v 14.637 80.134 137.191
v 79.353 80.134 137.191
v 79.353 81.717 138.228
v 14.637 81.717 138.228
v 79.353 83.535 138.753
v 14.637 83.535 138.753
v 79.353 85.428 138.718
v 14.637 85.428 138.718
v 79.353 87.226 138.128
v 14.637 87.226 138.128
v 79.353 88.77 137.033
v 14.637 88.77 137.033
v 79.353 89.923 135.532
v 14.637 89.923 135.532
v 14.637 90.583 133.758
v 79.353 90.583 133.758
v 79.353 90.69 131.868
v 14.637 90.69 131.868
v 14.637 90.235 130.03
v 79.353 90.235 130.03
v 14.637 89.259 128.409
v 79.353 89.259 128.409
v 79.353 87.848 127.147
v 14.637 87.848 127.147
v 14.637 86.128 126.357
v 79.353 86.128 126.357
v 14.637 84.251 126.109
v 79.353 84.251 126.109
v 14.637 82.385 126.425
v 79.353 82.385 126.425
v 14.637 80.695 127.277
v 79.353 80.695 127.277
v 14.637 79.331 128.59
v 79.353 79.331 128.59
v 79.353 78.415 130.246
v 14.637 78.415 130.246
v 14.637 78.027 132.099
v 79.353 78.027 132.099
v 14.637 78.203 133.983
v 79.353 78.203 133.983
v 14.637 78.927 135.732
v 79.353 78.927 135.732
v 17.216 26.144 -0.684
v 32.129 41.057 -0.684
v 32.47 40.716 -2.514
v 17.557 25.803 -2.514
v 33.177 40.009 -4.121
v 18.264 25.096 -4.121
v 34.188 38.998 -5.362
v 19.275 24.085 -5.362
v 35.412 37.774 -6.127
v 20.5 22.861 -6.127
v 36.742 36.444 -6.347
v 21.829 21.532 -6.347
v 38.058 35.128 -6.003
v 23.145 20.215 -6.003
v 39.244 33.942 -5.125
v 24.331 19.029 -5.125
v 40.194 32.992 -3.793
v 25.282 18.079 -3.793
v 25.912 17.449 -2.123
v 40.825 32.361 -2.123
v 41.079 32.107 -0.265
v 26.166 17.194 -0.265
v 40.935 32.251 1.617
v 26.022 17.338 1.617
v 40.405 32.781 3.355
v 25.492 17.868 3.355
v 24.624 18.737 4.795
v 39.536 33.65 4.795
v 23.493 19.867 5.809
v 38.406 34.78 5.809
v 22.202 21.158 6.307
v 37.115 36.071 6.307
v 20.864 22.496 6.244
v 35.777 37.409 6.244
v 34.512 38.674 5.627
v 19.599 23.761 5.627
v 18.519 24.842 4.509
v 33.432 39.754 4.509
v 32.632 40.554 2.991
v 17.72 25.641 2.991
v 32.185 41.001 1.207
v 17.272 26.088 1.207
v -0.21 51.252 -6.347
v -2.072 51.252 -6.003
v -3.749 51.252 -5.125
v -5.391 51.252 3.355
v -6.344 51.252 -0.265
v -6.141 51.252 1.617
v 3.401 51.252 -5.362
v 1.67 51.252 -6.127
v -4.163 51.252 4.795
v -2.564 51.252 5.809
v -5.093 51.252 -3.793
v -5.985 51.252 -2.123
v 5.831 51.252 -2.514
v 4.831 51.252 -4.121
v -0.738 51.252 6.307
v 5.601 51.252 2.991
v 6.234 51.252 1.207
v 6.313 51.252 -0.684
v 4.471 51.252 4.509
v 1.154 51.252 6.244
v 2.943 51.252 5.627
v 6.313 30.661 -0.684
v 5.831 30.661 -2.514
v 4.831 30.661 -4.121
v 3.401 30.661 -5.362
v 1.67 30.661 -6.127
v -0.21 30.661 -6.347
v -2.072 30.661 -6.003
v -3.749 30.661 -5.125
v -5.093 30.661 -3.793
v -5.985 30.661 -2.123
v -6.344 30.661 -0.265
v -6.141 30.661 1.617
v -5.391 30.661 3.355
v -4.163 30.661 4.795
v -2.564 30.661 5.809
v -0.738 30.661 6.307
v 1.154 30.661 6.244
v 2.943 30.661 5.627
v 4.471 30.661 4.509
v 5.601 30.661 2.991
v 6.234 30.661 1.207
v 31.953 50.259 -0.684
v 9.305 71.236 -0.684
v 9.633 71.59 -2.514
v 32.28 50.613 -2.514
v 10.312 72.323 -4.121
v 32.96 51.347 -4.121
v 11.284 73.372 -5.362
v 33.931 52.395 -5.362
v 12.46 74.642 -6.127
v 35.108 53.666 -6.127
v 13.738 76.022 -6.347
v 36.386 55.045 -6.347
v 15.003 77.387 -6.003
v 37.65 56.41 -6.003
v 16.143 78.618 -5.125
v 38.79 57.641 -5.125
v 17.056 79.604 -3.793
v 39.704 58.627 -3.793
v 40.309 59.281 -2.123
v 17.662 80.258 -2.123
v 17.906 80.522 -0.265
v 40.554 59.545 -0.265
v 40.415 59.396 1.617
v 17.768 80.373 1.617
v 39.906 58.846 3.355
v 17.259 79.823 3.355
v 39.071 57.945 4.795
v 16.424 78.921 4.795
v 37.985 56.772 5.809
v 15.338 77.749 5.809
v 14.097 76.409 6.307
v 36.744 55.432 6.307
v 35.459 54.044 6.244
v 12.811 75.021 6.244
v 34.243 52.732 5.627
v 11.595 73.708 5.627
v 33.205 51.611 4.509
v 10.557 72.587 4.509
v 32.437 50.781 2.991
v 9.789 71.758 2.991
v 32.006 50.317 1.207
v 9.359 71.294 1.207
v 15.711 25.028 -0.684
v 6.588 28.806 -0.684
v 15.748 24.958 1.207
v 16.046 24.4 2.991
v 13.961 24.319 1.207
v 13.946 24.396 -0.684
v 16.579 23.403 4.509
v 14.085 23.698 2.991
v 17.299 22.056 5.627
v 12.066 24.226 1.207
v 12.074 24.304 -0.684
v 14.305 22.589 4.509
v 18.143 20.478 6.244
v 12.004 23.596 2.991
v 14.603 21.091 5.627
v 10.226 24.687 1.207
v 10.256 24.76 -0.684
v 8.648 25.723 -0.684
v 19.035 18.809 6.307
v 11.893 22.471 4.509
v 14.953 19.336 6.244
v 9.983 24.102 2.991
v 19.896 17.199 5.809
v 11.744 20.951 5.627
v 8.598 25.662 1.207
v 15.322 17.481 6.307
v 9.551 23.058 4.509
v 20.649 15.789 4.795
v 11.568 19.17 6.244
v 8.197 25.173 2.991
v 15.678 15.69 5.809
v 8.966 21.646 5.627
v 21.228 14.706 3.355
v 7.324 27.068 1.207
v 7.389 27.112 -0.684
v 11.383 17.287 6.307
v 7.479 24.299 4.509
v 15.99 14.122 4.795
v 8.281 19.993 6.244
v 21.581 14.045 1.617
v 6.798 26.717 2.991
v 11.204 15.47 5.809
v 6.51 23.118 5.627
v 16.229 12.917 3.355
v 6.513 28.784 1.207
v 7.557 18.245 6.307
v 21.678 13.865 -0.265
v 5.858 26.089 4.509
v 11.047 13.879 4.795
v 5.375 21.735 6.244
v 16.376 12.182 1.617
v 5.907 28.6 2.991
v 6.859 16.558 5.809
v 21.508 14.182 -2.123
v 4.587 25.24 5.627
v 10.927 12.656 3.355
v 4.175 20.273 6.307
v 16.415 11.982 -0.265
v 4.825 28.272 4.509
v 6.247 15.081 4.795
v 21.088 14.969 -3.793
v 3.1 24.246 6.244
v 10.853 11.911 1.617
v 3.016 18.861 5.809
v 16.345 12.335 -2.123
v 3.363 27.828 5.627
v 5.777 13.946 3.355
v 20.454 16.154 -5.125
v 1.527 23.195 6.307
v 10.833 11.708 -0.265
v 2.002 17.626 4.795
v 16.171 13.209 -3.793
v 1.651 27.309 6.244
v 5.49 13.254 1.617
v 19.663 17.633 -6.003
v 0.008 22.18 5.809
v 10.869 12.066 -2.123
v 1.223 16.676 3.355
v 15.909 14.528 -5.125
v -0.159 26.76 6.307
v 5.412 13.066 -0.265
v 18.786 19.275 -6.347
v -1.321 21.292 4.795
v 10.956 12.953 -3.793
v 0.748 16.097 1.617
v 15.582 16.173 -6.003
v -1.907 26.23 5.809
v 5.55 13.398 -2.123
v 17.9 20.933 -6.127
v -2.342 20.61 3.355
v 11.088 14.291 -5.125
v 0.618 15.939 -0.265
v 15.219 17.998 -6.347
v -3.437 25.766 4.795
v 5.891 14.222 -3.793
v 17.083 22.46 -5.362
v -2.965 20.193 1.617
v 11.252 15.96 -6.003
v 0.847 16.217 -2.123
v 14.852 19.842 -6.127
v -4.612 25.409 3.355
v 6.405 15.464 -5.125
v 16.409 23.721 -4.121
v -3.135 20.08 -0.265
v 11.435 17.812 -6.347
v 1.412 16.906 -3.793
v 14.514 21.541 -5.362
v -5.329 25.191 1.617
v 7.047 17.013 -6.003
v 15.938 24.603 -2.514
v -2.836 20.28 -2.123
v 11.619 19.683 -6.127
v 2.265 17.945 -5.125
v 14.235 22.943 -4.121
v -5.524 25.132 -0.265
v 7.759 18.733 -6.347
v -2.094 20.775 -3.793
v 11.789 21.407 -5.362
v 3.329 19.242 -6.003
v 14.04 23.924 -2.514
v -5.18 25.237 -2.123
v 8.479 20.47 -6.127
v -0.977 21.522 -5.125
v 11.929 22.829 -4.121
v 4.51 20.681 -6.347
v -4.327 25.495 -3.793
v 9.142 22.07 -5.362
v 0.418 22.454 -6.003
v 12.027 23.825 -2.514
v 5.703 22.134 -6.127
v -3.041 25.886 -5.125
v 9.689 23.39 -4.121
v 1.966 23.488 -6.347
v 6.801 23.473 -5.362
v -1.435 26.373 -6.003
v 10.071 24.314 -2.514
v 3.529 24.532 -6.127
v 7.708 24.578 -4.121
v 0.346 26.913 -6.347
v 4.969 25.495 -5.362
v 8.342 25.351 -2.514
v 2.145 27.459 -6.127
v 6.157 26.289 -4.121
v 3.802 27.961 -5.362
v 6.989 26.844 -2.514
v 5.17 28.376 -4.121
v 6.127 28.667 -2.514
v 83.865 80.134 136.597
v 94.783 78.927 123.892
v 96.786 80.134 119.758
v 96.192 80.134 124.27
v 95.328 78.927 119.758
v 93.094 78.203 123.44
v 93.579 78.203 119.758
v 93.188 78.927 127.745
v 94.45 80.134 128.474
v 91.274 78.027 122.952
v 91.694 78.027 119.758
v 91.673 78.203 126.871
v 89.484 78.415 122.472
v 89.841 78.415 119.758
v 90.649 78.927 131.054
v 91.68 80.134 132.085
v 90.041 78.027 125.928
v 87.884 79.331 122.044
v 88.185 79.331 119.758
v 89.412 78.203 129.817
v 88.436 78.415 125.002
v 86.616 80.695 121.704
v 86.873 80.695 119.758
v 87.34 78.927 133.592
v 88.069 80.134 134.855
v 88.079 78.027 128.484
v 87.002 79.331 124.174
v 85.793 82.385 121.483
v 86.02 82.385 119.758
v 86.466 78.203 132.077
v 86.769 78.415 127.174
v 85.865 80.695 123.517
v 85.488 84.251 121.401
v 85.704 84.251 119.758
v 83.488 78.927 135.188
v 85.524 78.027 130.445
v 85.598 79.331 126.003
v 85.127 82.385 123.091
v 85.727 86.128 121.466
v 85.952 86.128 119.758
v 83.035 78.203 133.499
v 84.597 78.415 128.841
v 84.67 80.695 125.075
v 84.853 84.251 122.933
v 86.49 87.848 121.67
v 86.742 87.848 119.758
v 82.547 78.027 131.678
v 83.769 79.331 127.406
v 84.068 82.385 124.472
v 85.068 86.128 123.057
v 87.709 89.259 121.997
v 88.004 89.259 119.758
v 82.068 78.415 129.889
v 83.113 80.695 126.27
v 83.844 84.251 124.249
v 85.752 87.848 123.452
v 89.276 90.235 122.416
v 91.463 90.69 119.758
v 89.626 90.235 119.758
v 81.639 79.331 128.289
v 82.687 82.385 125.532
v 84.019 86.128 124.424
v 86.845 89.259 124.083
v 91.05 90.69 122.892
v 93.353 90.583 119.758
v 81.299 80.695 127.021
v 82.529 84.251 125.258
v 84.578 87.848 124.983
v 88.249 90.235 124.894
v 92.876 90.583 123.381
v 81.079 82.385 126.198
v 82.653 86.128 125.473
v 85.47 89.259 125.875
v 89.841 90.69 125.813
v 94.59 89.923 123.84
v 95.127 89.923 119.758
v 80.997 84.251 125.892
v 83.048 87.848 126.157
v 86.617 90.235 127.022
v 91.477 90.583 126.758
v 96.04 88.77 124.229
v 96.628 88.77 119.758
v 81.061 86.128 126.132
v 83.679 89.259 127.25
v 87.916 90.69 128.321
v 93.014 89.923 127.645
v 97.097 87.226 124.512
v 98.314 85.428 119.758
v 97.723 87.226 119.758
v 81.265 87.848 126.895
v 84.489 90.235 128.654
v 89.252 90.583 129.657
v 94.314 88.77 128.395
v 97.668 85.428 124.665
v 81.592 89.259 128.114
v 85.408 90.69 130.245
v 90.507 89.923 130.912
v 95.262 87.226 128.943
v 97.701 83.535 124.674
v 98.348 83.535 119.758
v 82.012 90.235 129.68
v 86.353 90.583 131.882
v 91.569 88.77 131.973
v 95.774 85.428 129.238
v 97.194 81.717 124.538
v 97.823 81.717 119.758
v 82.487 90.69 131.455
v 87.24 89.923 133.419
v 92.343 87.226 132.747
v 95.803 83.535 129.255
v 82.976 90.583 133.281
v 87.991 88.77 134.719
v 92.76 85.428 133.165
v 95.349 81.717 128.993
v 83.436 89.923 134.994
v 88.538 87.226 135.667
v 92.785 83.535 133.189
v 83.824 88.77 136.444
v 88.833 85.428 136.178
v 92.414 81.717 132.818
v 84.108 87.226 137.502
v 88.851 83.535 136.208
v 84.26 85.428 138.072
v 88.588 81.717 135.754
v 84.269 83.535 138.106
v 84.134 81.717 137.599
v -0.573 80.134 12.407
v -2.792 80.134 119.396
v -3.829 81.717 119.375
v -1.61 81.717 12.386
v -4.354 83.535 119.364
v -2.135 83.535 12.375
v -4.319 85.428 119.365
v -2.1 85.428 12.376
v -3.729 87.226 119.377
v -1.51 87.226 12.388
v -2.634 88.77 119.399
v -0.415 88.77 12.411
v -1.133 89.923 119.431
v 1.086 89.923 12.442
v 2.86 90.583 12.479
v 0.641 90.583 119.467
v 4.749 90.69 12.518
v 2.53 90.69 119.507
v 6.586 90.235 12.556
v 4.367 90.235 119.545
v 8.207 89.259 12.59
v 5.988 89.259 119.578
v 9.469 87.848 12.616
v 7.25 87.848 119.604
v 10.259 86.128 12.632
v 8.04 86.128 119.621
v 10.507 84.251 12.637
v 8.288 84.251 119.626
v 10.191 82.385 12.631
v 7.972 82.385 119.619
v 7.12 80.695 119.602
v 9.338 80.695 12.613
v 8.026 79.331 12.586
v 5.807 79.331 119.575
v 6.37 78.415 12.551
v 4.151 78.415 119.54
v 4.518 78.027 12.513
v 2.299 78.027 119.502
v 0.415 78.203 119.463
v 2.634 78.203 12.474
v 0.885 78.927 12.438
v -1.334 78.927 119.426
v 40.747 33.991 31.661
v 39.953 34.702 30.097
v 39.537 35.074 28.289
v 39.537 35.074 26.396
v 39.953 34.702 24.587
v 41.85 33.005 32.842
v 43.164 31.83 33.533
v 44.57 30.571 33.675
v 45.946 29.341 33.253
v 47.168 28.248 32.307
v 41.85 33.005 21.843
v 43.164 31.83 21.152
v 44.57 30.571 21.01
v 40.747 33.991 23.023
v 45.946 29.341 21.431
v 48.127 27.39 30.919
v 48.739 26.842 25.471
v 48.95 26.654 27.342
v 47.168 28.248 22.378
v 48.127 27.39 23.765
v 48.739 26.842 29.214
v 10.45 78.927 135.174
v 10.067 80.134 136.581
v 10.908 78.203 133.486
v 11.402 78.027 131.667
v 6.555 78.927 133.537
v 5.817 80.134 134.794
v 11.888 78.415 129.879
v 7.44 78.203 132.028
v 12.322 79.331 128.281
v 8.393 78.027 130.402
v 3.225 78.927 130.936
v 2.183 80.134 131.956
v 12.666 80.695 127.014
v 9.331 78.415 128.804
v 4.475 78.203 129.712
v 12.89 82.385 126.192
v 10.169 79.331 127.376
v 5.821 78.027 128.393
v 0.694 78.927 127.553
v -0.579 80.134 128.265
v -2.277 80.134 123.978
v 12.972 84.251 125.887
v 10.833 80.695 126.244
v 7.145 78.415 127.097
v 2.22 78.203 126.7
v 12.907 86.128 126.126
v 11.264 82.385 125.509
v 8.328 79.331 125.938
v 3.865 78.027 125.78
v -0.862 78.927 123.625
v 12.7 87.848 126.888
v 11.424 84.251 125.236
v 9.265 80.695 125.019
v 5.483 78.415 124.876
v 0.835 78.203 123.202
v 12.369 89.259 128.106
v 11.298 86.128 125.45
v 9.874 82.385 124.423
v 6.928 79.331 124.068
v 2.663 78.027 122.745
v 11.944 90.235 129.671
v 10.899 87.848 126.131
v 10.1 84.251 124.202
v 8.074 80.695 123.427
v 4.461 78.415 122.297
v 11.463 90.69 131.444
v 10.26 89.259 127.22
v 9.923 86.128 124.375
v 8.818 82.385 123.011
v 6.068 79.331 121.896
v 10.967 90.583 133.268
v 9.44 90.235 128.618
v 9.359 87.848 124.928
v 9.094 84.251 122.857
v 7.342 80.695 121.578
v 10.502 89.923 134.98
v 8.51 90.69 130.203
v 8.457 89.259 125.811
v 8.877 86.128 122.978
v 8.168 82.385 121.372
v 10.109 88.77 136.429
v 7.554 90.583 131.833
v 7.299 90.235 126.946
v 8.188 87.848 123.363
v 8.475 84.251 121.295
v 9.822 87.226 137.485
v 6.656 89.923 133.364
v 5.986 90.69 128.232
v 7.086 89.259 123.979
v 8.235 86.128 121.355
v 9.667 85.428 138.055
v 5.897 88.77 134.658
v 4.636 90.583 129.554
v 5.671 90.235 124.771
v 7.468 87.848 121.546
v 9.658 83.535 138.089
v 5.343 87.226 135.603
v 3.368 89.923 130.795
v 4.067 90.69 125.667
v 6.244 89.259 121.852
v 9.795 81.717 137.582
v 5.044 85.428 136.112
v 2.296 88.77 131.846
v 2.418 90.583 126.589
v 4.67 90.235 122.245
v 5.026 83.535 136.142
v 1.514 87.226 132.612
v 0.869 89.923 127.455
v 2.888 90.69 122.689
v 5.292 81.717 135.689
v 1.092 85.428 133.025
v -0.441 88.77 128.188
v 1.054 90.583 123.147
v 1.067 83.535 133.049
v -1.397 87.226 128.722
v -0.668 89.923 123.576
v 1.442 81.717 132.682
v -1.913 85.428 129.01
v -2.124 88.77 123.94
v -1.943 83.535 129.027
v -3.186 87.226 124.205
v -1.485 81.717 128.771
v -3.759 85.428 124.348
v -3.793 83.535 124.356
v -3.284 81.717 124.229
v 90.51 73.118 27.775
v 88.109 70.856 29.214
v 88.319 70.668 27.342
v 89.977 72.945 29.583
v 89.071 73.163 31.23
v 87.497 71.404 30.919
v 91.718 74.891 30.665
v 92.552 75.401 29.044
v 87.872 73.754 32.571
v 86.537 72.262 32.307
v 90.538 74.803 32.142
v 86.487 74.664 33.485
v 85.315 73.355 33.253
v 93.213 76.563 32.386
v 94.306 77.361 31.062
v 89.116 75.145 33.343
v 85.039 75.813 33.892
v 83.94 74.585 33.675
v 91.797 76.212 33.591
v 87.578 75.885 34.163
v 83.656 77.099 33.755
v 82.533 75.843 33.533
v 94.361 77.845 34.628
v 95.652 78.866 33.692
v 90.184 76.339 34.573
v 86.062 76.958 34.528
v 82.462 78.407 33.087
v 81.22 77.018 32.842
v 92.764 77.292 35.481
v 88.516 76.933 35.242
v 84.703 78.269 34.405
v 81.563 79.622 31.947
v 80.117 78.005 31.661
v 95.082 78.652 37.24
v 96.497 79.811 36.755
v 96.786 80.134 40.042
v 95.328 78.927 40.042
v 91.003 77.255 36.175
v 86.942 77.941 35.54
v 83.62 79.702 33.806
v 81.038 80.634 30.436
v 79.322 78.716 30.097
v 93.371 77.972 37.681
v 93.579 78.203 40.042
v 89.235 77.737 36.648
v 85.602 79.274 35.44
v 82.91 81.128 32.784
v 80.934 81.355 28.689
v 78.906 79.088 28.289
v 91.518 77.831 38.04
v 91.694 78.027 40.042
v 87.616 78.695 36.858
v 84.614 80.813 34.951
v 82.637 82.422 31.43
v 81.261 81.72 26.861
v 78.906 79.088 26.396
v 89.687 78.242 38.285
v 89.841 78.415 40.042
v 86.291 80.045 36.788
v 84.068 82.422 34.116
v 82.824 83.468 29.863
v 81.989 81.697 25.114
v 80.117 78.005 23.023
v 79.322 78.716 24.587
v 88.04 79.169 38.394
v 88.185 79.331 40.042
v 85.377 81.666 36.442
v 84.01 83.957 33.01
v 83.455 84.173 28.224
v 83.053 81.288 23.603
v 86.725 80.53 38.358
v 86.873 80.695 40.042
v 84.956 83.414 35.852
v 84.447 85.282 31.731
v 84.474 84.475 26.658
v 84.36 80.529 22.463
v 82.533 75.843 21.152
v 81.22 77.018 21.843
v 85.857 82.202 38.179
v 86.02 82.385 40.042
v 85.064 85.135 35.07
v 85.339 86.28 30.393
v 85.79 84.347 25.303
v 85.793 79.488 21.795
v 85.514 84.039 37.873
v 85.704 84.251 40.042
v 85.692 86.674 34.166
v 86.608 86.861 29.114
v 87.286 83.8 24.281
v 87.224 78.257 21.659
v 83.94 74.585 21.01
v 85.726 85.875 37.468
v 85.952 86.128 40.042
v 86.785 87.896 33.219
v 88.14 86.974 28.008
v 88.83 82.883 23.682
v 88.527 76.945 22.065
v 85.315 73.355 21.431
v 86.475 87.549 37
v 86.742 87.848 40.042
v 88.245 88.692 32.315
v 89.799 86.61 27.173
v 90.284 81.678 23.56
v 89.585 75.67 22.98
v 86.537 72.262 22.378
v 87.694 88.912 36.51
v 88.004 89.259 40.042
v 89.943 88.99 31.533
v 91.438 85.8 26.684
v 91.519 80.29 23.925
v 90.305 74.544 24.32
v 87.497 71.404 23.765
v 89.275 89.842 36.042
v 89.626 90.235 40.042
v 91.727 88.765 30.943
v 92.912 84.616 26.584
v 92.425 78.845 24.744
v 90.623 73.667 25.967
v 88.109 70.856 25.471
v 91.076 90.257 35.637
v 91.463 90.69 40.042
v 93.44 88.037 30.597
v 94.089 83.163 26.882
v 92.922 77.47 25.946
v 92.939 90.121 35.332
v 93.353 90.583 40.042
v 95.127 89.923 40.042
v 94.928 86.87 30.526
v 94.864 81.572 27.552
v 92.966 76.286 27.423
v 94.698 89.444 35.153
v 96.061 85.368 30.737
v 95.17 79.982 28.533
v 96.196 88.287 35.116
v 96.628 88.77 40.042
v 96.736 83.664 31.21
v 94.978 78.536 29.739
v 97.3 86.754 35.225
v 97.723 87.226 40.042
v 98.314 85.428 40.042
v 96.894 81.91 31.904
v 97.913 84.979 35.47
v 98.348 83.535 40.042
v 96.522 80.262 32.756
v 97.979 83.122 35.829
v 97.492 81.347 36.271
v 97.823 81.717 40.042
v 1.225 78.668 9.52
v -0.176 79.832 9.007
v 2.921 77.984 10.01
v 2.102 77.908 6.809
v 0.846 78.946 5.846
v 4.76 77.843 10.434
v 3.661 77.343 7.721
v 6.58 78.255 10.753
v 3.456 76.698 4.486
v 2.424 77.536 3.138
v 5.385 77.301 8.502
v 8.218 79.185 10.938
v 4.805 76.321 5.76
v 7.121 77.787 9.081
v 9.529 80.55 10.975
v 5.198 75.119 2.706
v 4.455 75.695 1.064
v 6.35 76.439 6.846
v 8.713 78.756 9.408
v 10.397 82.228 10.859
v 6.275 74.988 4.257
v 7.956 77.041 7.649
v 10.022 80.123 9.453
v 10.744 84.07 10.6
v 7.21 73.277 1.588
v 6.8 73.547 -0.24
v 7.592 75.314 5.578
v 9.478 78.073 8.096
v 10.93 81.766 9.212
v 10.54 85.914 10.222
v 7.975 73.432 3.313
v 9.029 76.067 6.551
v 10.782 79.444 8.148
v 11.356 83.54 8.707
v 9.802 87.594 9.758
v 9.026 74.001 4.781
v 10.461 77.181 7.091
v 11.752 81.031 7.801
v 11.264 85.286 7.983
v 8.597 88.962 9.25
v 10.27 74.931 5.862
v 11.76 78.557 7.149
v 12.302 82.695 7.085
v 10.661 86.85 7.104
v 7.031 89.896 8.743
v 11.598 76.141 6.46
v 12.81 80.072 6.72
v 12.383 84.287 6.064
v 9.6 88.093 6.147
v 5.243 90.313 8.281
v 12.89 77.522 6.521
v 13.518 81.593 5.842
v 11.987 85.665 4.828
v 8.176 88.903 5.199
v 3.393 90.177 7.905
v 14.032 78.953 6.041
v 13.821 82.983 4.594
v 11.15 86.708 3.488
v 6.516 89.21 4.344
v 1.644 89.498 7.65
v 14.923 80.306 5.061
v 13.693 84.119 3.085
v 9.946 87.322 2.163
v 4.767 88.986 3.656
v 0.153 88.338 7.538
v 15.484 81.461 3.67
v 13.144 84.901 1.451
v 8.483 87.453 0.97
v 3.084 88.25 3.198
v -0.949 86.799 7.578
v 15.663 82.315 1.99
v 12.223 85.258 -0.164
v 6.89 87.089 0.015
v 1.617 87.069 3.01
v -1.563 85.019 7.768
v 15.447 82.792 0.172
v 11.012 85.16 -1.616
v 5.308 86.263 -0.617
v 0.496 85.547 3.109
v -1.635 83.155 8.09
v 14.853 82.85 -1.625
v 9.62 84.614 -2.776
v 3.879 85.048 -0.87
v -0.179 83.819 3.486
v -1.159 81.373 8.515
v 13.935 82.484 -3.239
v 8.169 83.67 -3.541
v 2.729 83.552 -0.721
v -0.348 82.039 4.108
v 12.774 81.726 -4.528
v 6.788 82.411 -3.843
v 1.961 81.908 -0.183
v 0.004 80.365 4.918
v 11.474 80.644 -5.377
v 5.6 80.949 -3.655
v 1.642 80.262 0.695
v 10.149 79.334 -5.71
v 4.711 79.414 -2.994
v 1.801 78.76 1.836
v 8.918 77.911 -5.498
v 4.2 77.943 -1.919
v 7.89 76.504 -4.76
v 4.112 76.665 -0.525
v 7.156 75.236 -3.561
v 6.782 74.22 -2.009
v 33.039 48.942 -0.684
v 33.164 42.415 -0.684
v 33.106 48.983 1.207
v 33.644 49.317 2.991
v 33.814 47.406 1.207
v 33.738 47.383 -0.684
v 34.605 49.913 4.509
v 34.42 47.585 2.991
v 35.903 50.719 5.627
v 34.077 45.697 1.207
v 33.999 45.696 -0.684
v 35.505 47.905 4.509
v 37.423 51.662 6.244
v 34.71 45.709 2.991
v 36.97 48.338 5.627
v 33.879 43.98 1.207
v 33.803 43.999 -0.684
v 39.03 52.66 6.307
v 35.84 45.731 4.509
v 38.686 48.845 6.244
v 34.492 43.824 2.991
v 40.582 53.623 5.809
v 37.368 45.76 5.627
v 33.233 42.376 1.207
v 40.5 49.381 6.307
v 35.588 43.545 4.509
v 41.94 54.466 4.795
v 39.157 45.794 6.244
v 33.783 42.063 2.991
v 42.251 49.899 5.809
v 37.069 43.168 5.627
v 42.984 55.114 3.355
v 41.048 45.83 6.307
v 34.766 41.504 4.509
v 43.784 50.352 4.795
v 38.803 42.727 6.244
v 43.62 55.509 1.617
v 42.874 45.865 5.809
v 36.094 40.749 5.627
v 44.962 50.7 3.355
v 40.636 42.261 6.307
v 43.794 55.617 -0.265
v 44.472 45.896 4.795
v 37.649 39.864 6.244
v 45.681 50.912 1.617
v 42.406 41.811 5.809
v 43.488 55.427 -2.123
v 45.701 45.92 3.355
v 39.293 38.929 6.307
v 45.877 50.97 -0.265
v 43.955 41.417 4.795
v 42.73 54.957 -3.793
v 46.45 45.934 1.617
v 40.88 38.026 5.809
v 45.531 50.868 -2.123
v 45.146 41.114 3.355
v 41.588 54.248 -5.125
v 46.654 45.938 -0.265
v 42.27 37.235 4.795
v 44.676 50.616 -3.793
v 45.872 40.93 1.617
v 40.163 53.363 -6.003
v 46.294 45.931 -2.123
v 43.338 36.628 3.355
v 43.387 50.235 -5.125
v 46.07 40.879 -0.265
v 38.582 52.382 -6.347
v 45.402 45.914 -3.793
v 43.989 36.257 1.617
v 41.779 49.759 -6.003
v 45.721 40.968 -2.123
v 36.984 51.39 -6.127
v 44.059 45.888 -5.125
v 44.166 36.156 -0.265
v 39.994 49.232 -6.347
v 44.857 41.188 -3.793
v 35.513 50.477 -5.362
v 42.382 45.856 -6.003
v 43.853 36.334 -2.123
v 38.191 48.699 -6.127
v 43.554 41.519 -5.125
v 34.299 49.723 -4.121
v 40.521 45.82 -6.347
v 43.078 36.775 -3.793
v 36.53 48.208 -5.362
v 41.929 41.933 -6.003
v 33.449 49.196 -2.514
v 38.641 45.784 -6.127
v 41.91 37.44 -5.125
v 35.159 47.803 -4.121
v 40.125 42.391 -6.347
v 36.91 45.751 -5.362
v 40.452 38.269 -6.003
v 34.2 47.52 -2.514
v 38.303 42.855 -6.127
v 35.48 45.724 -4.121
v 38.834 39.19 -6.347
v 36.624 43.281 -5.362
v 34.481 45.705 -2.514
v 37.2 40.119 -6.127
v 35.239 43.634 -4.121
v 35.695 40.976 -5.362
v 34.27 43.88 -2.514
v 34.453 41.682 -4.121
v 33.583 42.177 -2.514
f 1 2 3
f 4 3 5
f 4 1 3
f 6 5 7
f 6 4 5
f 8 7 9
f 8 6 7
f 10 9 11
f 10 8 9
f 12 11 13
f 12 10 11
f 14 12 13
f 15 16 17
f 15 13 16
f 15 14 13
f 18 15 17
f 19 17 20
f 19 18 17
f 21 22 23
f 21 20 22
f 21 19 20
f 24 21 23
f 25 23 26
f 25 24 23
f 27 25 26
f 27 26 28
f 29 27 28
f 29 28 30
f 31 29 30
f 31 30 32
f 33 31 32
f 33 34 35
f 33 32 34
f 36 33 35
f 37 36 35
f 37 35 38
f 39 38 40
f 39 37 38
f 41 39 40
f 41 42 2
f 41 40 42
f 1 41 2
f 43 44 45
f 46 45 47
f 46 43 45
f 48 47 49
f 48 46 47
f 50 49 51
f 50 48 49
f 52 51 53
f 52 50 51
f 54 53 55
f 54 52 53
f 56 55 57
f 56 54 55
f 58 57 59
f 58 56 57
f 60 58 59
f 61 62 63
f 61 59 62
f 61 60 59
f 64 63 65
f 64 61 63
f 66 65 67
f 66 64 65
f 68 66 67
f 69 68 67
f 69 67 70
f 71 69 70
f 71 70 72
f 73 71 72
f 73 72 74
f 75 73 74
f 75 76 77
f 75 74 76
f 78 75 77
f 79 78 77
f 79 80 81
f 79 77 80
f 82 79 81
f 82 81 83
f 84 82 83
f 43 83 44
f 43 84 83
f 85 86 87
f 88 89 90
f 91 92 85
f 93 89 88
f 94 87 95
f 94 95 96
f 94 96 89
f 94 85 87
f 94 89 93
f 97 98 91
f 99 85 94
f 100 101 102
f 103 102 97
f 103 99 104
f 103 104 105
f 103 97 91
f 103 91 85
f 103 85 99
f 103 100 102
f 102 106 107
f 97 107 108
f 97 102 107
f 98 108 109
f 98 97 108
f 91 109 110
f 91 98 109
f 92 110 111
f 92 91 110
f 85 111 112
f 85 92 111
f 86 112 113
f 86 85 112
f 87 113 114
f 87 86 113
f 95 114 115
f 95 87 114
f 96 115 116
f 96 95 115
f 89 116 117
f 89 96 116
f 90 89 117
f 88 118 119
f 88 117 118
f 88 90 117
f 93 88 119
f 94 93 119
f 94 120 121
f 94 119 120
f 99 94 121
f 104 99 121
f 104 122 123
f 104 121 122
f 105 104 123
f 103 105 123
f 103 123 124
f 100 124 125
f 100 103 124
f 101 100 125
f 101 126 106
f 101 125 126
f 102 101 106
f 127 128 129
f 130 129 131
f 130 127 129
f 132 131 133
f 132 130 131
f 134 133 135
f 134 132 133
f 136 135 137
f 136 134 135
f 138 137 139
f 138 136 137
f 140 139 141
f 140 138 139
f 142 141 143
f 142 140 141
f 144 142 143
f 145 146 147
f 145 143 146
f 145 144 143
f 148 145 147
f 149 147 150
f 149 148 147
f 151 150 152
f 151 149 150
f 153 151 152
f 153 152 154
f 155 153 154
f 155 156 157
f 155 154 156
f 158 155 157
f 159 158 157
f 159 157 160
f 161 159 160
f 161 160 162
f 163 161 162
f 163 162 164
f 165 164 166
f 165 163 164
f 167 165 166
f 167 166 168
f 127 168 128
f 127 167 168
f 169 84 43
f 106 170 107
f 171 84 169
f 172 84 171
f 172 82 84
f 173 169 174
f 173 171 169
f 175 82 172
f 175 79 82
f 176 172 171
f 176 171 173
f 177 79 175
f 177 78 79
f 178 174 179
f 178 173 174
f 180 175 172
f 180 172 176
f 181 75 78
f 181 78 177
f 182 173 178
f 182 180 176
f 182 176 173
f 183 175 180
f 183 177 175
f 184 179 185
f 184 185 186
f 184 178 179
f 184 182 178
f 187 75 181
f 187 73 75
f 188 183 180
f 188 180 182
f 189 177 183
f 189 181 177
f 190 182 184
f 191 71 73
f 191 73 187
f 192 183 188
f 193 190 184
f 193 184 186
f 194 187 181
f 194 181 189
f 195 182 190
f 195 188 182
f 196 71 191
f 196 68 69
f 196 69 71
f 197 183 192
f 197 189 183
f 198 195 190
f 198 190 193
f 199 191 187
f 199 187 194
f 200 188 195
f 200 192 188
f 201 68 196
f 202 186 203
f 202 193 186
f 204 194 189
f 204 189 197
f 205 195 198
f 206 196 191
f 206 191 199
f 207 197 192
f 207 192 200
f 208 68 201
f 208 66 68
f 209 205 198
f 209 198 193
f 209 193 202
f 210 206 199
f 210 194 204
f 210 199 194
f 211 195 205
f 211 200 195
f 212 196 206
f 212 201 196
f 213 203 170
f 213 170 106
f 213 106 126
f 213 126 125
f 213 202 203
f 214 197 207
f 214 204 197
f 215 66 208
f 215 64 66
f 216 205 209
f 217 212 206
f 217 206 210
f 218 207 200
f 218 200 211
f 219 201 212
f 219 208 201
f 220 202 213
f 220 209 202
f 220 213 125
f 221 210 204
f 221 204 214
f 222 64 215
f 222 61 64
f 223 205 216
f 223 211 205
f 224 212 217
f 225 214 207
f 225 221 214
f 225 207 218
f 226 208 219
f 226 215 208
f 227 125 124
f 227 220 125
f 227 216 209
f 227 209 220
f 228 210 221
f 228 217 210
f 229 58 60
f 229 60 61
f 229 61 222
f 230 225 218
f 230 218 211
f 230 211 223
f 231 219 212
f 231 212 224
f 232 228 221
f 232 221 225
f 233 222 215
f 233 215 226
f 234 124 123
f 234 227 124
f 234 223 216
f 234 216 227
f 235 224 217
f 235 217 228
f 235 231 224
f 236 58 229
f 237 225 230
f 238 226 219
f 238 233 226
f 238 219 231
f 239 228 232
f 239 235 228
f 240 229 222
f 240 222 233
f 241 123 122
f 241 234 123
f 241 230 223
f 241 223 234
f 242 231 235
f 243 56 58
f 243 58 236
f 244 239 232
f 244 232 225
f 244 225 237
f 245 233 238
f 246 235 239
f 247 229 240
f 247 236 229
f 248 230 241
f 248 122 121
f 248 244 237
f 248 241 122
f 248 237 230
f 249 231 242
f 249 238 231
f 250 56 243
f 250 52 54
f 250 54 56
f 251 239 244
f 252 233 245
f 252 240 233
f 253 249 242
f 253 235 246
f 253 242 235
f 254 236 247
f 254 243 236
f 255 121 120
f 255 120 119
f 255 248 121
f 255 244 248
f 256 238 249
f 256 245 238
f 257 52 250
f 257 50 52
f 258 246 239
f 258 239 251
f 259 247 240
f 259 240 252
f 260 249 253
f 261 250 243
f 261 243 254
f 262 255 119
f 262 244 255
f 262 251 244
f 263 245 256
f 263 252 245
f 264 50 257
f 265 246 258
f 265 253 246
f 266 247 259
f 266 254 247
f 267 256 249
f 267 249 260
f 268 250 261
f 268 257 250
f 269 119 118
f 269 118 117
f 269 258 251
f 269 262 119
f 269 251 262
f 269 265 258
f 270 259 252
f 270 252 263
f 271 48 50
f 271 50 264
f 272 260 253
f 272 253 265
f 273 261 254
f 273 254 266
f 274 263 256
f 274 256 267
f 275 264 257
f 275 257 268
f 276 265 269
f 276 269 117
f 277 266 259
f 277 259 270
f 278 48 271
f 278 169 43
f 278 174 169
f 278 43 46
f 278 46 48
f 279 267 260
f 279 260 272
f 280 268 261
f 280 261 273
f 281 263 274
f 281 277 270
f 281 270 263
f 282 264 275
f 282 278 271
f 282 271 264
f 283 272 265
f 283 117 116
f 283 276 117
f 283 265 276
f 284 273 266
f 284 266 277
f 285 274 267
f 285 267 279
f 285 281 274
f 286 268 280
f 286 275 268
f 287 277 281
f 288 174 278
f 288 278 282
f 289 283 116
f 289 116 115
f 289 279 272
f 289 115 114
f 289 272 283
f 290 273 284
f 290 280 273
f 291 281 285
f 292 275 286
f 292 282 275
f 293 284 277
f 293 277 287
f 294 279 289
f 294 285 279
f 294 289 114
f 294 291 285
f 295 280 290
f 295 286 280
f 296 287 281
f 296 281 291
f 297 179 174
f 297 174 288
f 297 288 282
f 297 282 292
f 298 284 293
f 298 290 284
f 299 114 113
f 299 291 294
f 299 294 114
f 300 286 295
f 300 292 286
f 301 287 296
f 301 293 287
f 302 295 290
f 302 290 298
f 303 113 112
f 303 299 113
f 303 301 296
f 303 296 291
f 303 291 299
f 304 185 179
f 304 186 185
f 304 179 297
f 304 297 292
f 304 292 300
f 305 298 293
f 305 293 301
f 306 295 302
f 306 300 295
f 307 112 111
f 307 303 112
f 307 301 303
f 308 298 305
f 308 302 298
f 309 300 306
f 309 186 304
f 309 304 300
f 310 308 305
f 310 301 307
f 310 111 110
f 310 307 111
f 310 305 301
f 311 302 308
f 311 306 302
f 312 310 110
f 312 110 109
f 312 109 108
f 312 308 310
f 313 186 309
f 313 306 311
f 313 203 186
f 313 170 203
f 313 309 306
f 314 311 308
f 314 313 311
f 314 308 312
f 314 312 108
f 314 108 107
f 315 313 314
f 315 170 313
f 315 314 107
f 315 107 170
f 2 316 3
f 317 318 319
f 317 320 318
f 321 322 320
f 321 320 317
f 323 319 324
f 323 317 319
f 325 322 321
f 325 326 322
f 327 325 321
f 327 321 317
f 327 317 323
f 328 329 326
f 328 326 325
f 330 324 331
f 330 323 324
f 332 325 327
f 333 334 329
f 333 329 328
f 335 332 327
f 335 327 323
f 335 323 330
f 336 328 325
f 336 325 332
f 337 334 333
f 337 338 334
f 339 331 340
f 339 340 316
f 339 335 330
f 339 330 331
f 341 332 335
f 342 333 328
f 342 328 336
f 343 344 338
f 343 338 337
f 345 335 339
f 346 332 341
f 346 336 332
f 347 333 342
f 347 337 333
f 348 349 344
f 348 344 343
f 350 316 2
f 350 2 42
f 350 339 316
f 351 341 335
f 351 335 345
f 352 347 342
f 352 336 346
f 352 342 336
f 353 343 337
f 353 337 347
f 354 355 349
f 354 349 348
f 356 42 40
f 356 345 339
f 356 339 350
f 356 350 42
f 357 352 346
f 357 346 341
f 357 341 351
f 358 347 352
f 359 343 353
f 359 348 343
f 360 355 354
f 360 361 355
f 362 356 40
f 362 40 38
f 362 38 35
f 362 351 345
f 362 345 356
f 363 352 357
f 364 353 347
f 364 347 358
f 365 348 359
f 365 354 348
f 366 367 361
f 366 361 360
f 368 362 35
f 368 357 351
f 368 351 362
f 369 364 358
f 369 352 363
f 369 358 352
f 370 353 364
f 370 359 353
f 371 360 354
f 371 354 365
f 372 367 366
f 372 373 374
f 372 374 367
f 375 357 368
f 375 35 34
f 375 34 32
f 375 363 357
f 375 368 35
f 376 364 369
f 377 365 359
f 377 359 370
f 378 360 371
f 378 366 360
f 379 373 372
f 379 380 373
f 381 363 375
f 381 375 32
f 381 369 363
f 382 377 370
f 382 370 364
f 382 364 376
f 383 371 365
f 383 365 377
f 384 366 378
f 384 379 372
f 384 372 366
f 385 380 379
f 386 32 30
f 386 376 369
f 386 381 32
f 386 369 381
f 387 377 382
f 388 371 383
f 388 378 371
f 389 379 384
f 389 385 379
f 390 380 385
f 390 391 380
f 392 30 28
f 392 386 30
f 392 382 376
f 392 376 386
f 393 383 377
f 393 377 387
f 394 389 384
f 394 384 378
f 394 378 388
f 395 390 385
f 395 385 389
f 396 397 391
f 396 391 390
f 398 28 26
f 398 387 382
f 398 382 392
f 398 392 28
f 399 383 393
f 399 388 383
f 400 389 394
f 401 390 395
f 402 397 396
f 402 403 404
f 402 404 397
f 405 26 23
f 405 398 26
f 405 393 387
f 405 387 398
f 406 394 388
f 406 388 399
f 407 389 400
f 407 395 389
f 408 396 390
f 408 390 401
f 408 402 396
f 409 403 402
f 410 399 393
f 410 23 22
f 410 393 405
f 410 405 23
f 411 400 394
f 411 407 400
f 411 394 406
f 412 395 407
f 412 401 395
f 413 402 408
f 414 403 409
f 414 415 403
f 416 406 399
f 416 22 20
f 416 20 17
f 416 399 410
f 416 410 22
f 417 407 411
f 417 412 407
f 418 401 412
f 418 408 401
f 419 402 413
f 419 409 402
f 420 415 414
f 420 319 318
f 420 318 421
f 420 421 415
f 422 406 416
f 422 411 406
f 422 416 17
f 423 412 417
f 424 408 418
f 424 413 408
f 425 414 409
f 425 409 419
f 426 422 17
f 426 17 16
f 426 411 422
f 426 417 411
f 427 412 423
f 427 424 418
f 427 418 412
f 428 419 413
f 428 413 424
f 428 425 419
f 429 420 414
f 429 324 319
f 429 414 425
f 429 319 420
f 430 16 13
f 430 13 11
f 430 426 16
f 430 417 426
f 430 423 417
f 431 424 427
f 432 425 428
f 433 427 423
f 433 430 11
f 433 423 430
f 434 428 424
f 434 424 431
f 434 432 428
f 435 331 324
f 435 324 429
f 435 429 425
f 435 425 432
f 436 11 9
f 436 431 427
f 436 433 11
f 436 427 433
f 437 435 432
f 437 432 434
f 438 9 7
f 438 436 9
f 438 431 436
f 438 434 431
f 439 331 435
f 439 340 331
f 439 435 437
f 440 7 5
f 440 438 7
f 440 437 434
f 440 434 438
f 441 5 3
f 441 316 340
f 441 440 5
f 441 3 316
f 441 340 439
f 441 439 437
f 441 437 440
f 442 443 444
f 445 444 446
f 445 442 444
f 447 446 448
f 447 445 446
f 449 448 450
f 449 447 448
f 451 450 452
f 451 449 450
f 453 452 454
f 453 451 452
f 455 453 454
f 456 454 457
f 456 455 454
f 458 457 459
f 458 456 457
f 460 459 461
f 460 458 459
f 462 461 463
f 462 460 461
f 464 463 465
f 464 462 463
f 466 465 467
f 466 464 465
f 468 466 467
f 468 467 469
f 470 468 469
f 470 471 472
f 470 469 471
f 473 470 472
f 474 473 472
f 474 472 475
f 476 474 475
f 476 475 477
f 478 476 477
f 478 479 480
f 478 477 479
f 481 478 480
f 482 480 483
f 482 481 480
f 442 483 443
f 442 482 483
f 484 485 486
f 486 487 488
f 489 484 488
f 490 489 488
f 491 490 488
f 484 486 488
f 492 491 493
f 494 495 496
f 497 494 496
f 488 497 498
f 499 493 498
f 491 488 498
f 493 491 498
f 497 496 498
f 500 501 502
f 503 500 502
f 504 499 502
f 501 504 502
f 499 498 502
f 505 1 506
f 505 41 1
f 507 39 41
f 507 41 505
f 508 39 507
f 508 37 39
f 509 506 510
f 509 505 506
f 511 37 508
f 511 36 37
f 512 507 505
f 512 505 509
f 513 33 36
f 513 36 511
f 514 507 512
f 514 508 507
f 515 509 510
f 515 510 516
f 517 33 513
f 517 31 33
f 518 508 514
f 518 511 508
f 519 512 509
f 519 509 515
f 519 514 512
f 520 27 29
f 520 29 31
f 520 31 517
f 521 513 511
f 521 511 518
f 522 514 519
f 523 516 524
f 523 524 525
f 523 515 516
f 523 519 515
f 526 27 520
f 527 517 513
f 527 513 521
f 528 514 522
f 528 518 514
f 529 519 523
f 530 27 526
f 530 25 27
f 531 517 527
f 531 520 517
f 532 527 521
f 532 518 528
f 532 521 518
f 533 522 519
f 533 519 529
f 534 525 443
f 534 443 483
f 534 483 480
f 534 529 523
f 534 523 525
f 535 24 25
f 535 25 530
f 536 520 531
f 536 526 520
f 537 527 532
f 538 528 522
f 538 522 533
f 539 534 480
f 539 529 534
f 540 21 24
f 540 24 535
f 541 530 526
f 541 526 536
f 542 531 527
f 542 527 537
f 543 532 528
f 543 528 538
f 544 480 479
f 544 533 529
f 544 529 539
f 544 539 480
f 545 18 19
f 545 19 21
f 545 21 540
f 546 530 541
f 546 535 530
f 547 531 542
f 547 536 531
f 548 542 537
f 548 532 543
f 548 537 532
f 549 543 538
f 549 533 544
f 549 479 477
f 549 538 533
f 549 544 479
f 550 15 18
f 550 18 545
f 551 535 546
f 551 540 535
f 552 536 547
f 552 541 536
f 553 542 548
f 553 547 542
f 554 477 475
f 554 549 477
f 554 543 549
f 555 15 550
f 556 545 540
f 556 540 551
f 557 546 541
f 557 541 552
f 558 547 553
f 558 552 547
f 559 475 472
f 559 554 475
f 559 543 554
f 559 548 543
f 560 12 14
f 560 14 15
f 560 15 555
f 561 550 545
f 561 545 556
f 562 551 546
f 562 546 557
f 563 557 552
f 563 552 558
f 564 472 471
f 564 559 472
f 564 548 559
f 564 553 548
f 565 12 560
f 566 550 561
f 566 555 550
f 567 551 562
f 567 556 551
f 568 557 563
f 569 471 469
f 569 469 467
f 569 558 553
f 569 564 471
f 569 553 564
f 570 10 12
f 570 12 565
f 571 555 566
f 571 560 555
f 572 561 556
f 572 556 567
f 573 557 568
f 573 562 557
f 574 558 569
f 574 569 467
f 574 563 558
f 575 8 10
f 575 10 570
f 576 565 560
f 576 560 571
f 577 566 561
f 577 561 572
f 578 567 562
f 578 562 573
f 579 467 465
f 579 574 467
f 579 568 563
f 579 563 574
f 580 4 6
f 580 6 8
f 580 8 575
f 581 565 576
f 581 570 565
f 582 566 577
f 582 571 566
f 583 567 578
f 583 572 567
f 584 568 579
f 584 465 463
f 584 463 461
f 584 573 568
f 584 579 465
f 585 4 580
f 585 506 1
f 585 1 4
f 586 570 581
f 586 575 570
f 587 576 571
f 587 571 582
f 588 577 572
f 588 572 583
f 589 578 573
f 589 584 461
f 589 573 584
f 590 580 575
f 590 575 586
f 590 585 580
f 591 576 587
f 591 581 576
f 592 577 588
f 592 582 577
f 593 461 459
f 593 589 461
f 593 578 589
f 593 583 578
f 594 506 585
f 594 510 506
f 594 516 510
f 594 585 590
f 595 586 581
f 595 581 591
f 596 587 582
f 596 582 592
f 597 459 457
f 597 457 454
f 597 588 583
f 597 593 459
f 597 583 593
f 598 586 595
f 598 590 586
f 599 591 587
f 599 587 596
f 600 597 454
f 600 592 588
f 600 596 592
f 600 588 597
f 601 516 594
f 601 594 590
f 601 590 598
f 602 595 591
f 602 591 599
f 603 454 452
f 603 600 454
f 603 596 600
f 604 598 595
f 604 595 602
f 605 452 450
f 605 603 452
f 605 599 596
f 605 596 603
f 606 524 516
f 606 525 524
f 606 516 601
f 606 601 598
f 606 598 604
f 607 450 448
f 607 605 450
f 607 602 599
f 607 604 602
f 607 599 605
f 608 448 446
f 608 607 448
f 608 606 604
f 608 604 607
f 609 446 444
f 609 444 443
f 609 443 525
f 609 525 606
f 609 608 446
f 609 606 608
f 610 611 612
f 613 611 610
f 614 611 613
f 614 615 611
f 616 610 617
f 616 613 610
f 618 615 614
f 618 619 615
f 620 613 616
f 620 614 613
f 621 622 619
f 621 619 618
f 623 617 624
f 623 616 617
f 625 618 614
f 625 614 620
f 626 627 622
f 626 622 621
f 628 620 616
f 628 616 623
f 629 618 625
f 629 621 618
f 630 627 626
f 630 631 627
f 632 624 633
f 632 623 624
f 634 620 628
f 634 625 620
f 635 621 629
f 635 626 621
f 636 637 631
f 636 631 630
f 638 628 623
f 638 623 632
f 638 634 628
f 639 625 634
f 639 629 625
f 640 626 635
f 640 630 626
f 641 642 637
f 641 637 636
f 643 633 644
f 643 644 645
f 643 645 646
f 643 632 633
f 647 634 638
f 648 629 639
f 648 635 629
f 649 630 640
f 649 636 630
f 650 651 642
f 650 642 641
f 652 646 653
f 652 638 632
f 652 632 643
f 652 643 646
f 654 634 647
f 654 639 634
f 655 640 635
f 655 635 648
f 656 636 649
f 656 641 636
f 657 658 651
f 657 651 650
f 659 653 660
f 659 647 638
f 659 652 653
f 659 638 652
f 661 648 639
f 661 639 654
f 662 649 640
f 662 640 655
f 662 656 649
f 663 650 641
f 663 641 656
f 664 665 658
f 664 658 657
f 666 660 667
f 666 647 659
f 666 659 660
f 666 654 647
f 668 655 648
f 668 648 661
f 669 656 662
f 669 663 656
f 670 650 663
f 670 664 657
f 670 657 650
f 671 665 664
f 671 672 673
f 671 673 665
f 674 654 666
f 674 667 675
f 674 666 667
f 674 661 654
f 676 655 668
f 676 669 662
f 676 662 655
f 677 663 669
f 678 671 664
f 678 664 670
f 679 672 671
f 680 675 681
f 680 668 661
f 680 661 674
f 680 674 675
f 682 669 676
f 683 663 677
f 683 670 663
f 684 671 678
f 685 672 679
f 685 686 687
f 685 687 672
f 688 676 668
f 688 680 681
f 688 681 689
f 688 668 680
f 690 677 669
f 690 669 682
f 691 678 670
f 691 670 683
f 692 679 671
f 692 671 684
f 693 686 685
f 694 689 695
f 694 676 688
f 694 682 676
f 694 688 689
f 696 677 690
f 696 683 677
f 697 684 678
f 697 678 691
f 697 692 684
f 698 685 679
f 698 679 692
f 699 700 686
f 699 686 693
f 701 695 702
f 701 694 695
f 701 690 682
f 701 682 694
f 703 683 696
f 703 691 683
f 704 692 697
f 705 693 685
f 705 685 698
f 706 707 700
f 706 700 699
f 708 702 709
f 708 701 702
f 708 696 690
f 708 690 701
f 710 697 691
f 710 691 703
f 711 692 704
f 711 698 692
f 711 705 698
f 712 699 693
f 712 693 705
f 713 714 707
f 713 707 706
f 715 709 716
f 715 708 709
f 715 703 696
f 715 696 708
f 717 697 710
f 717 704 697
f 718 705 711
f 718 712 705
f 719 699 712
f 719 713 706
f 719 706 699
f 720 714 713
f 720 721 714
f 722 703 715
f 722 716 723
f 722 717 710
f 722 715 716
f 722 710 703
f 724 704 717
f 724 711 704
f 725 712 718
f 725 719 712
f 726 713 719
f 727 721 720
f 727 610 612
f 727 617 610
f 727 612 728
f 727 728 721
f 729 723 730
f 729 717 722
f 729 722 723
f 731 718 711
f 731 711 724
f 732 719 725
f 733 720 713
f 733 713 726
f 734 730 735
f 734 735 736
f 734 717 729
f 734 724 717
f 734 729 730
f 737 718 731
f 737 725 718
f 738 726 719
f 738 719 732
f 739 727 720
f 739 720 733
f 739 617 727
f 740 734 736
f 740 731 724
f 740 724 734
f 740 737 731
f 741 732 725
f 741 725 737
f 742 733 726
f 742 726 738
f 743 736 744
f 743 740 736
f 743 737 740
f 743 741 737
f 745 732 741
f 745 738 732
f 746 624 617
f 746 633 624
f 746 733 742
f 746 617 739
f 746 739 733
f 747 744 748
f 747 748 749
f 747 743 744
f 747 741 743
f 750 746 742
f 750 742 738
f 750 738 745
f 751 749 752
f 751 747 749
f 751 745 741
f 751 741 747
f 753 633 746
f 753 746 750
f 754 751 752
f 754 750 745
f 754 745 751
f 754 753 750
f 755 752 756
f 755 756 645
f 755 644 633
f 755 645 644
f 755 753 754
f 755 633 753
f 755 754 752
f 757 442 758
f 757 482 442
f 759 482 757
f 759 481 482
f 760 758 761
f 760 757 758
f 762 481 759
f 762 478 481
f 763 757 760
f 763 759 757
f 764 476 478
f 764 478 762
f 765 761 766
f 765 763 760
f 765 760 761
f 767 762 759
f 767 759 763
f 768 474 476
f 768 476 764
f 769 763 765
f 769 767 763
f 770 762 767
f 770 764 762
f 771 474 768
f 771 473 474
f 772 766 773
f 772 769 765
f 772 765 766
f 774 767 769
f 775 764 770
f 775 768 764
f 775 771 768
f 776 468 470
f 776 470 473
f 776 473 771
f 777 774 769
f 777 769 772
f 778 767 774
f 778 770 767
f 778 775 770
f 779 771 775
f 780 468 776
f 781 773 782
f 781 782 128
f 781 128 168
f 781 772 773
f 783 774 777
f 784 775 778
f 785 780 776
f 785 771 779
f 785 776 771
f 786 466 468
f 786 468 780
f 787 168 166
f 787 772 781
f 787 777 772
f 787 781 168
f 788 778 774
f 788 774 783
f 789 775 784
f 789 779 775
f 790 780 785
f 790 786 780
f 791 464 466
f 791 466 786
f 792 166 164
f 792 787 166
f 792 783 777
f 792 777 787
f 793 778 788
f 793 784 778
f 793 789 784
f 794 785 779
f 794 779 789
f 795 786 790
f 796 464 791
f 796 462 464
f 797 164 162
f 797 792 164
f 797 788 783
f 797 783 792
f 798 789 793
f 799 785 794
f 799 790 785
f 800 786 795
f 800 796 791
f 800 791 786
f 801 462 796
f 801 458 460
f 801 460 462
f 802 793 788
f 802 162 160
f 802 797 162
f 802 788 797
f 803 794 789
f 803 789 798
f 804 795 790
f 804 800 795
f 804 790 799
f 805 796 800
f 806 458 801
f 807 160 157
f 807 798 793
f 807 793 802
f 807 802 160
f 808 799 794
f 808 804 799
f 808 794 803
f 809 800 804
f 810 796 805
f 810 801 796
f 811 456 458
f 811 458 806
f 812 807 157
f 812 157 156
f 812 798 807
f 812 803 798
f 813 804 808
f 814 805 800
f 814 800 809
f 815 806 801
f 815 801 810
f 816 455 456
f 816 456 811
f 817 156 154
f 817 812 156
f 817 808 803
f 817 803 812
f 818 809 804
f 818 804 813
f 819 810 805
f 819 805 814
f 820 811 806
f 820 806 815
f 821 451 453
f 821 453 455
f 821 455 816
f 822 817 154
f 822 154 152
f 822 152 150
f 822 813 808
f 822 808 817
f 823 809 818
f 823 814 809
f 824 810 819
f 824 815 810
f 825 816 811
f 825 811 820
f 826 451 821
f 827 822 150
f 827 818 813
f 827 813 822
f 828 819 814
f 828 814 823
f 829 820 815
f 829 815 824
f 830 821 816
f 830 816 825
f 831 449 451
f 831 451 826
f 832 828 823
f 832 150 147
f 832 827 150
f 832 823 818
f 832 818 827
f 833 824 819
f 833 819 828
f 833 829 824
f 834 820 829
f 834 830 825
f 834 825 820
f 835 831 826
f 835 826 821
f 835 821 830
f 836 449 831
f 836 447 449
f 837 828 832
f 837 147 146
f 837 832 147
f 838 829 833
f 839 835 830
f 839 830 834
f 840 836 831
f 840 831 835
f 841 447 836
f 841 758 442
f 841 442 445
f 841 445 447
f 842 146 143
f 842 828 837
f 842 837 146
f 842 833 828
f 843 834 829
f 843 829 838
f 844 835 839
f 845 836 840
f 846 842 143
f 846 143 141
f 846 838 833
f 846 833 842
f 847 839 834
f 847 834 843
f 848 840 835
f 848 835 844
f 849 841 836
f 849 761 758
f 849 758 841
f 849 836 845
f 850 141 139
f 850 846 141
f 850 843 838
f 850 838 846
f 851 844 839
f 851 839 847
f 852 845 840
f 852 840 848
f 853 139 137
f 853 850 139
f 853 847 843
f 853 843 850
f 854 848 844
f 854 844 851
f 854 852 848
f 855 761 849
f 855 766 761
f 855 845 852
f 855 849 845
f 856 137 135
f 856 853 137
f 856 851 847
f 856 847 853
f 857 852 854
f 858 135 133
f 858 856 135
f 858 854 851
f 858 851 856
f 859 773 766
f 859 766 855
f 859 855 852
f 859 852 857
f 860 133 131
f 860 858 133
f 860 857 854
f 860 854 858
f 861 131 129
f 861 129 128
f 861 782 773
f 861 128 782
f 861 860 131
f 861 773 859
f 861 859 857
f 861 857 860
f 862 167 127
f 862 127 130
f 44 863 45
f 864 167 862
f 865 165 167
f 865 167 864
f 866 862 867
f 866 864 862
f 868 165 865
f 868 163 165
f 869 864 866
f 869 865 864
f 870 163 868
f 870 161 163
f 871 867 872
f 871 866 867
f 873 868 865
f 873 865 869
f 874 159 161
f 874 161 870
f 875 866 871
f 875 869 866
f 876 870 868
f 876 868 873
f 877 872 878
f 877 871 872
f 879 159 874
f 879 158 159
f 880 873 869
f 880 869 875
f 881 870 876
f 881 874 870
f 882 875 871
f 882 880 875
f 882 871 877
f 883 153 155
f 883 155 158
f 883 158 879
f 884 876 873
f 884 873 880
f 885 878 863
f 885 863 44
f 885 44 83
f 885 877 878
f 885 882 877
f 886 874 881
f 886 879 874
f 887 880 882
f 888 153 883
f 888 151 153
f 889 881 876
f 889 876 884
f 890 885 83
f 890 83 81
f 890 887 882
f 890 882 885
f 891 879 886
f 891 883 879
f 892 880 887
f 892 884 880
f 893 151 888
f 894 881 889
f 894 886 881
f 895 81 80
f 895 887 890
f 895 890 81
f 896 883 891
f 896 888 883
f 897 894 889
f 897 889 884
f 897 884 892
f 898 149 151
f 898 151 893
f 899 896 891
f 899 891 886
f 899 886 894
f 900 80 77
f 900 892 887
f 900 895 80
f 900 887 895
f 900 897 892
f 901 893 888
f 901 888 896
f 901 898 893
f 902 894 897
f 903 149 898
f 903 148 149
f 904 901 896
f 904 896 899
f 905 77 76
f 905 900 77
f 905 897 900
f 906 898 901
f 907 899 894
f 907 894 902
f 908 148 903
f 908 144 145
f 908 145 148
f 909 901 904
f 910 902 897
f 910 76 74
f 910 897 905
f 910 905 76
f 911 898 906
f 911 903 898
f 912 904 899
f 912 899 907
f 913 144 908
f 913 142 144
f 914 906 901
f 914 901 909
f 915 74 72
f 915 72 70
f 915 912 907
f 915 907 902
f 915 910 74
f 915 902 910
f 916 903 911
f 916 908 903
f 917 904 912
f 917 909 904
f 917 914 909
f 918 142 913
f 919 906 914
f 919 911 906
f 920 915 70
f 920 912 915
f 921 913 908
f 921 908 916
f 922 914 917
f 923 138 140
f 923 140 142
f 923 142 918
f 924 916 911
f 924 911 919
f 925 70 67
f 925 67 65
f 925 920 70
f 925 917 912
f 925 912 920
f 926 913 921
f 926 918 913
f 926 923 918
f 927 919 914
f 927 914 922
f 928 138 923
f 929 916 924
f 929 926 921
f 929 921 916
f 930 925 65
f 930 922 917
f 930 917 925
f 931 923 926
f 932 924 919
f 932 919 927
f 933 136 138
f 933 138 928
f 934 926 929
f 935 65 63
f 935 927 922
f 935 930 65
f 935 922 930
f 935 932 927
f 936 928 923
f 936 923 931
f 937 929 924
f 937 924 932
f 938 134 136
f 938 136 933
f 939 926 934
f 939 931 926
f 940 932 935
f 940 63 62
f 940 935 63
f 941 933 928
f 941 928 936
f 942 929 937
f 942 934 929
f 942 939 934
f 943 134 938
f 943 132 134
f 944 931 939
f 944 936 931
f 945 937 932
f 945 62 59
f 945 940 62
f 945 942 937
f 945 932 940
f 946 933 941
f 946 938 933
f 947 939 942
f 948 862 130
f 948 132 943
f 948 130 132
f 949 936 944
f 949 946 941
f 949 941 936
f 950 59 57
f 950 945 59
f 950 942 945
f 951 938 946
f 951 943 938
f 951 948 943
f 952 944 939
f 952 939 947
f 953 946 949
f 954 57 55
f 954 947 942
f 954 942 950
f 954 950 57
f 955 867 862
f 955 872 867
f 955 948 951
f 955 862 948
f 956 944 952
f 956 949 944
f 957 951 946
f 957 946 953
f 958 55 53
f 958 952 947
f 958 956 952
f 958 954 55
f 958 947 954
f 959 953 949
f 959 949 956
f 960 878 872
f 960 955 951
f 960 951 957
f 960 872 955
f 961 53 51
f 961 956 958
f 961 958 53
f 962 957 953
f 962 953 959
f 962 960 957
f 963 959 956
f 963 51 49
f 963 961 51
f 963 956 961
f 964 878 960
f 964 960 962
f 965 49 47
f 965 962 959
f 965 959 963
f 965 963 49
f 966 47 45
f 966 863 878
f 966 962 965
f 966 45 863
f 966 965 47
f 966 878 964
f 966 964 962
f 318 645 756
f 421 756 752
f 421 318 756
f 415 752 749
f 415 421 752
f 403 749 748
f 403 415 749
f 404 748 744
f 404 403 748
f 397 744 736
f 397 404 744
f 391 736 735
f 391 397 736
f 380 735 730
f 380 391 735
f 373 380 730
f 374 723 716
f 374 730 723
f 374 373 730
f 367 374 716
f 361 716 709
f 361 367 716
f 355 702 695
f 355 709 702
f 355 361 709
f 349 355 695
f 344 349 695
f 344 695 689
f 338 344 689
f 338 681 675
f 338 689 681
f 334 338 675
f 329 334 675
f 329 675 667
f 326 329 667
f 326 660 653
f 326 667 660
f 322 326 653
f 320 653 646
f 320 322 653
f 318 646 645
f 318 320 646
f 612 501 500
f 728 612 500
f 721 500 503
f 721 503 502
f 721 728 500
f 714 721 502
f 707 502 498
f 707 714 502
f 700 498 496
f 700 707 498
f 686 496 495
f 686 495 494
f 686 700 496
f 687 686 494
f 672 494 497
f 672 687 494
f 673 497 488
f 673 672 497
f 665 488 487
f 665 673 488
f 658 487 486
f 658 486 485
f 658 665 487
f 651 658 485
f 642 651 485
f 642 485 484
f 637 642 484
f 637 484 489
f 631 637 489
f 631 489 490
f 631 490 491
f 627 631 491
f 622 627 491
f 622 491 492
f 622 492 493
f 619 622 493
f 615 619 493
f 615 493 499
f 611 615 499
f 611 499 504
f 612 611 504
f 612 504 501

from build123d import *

# Parameters (mm, degrees)
SWEEP1_PROFILE_R = 6.35


with BuildPart() as part:
    # Sweep1: sweep along a curve in space
    with BuildLine() as sweep1_path:
        Line((0, 30.660512242, 0), (0, 51.251551799, 0))
        ThreePointArc((21.680256121, 21.680256121, 0), (7.839920409, 18.927242179, 0), (0, 30.660512242, 0))
        Line((21.680256121, 21.680256121, 0), (36.593044938, 36.593044938, 0))
        ThreePointArc((36.242775611, 54.890668065, 0), (40.310462498, 45.816371188, 0), (36.593044938, 36.593044938, 0))
        Line((13.595135631, 75.867499161, 0), (36.242775611, 54.890668065, 0))
        ThreePointArc((4.159082285, 84.367183458, 12.505555788), (7.022099563, 81.885473102, 3.65133177), (13.595135631, 75.867499161, 0))
        Line((4.159082285, 84.367183458, 12.505555788), (1.940115876, 84.367183458, 119.494337396))
        ThreePointArc((14.637385273, 84.367183458, 132.457681028), (5.564500833, 84.367183458, 128.64434339), (1.940115876, 84.367183458, 119.494337396))
        Line((14.637385273, 84.367183458, 132.457681028), (79.353045143, 84.367183458, 132.457681028))
        ThreePointArc((92.053045143, 84.367183458, 119.757681028), (88.333301264, 84.367183458, 128.737937149), (79.353045143, 84.367183458, 132.457681028))
        Line((92.053045143, 84.367183458, 119.757681028), (92.053045143, 84.367183458, 40.042301899))
        ThreePointArc((83.5860947, 74.901416178, 27.342301899), (89.573132774, 81.594724411, 31.062045778), (92.053045143, 84.367183458, 40.042301899))
        Line((44.216734329, 30.887788634, 27.342301899), (83.5860947, 74.901416178, 27.342301899))
    # Sweep1 profile (on start of the path) → Sweep1 (sweep)
    with BuildSketch(Plane(origin=(44.216734329, 30.887788634, 27.342301899), x_dir=(0.745336006287207, -0.6666890112577502, 0), z_dir=(0.6666890112577502, 0.745336006287207, 0))):
        Circle(SWEEP1_PROFILE_R)
    sweep(path=sweep1_path.line)


solid = part.part
